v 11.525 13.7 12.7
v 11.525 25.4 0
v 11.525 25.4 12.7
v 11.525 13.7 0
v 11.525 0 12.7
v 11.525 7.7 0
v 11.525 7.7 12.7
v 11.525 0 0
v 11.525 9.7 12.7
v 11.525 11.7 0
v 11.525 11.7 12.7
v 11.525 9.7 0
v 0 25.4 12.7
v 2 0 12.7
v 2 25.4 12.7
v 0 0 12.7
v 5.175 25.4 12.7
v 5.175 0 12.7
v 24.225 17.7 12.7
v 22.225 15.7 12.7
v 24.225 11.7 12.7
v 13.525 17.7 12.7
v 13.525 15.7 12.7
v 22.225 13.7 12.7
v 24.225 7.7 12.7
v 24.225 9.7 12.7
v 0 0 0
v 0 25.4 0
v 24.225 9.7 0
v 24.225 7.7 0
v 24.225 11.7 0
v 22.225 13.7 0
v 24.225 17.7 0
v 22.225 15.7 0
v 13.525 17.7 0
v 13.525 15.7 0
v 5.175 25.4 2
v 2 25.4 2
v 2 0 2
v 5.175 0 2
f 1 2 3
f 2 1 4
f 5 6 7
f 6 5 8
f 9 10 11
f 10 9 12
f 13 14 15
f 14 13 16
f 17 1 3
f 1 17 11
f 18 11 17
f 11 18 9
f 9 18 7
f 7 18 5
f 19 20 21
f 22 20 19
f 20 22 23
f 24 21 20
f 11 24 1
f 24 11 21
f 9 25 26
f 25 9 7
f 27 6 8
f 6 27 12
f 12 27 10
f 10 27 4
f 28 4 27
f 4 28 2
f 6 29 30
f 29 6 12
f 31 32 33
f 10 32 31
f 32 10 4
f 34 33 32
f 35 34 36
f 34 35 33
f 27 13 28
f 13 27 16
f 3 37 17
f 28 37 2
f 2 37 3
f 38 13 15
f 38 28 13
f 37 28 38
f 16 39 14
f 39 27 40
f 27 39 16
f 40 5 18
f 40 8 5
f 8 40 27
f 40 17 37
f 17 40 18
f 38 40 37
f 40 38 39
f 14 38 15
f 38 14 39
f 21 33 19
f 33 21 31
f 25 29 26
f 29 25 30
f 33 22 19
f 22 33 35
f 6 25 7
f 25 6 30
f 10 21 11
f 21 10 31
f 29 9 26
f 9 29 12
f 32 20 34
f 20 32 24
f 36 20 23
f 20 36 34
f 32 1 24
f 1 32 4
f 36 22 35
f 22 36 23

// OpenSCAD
inch = 25.4;

bed_thickness = 1/8*inch;
bed_elevation = 1/4*inch;
belt_thickness = 2;
clip_thickness = 2;
clip_width = 1/2*inch;
base_width = 1*inch;
base_height = 1/2*inch;


base_total = bed_thickness+bed_elevation+clip_thickness;
clip_total_width = clip_thickness*3+belt_thickness*2;
clip_start = base_width/2-clip_total_width/2;
union()
{
	difference()
	{
		cube(size=[base_total,base_width,clip_width]);
		translate(v=[clip_thickness,-0.1,clip_thickness])
			cube(size=[bed_thickness,base_width+0.2,clip_width]);
	}
	difference()
	{
		translate(v=[base_total,clip_start,0])
			cube(size=[clip_width,clip_total_width,clip_width]);
		translate(v=[base_total,clip_start+clip_thickness,-0.1])
			cube(size=[clip_width+0.1,clip_thickness,clip_width+0.2]);
		translate(v=[base_total,clip_start+3*clip_thickness,-0.1])
			cube(size=[clip_width-clip_thickness,clip_thickness,clip_width+0.2]);
		translate(v=[base_total,clip_start+clip_thickness*4-0.1,-0.1])
			cube(size=[clip_thickness,clip_thickness+0.2,clip_width+0.2]);
	}
}
